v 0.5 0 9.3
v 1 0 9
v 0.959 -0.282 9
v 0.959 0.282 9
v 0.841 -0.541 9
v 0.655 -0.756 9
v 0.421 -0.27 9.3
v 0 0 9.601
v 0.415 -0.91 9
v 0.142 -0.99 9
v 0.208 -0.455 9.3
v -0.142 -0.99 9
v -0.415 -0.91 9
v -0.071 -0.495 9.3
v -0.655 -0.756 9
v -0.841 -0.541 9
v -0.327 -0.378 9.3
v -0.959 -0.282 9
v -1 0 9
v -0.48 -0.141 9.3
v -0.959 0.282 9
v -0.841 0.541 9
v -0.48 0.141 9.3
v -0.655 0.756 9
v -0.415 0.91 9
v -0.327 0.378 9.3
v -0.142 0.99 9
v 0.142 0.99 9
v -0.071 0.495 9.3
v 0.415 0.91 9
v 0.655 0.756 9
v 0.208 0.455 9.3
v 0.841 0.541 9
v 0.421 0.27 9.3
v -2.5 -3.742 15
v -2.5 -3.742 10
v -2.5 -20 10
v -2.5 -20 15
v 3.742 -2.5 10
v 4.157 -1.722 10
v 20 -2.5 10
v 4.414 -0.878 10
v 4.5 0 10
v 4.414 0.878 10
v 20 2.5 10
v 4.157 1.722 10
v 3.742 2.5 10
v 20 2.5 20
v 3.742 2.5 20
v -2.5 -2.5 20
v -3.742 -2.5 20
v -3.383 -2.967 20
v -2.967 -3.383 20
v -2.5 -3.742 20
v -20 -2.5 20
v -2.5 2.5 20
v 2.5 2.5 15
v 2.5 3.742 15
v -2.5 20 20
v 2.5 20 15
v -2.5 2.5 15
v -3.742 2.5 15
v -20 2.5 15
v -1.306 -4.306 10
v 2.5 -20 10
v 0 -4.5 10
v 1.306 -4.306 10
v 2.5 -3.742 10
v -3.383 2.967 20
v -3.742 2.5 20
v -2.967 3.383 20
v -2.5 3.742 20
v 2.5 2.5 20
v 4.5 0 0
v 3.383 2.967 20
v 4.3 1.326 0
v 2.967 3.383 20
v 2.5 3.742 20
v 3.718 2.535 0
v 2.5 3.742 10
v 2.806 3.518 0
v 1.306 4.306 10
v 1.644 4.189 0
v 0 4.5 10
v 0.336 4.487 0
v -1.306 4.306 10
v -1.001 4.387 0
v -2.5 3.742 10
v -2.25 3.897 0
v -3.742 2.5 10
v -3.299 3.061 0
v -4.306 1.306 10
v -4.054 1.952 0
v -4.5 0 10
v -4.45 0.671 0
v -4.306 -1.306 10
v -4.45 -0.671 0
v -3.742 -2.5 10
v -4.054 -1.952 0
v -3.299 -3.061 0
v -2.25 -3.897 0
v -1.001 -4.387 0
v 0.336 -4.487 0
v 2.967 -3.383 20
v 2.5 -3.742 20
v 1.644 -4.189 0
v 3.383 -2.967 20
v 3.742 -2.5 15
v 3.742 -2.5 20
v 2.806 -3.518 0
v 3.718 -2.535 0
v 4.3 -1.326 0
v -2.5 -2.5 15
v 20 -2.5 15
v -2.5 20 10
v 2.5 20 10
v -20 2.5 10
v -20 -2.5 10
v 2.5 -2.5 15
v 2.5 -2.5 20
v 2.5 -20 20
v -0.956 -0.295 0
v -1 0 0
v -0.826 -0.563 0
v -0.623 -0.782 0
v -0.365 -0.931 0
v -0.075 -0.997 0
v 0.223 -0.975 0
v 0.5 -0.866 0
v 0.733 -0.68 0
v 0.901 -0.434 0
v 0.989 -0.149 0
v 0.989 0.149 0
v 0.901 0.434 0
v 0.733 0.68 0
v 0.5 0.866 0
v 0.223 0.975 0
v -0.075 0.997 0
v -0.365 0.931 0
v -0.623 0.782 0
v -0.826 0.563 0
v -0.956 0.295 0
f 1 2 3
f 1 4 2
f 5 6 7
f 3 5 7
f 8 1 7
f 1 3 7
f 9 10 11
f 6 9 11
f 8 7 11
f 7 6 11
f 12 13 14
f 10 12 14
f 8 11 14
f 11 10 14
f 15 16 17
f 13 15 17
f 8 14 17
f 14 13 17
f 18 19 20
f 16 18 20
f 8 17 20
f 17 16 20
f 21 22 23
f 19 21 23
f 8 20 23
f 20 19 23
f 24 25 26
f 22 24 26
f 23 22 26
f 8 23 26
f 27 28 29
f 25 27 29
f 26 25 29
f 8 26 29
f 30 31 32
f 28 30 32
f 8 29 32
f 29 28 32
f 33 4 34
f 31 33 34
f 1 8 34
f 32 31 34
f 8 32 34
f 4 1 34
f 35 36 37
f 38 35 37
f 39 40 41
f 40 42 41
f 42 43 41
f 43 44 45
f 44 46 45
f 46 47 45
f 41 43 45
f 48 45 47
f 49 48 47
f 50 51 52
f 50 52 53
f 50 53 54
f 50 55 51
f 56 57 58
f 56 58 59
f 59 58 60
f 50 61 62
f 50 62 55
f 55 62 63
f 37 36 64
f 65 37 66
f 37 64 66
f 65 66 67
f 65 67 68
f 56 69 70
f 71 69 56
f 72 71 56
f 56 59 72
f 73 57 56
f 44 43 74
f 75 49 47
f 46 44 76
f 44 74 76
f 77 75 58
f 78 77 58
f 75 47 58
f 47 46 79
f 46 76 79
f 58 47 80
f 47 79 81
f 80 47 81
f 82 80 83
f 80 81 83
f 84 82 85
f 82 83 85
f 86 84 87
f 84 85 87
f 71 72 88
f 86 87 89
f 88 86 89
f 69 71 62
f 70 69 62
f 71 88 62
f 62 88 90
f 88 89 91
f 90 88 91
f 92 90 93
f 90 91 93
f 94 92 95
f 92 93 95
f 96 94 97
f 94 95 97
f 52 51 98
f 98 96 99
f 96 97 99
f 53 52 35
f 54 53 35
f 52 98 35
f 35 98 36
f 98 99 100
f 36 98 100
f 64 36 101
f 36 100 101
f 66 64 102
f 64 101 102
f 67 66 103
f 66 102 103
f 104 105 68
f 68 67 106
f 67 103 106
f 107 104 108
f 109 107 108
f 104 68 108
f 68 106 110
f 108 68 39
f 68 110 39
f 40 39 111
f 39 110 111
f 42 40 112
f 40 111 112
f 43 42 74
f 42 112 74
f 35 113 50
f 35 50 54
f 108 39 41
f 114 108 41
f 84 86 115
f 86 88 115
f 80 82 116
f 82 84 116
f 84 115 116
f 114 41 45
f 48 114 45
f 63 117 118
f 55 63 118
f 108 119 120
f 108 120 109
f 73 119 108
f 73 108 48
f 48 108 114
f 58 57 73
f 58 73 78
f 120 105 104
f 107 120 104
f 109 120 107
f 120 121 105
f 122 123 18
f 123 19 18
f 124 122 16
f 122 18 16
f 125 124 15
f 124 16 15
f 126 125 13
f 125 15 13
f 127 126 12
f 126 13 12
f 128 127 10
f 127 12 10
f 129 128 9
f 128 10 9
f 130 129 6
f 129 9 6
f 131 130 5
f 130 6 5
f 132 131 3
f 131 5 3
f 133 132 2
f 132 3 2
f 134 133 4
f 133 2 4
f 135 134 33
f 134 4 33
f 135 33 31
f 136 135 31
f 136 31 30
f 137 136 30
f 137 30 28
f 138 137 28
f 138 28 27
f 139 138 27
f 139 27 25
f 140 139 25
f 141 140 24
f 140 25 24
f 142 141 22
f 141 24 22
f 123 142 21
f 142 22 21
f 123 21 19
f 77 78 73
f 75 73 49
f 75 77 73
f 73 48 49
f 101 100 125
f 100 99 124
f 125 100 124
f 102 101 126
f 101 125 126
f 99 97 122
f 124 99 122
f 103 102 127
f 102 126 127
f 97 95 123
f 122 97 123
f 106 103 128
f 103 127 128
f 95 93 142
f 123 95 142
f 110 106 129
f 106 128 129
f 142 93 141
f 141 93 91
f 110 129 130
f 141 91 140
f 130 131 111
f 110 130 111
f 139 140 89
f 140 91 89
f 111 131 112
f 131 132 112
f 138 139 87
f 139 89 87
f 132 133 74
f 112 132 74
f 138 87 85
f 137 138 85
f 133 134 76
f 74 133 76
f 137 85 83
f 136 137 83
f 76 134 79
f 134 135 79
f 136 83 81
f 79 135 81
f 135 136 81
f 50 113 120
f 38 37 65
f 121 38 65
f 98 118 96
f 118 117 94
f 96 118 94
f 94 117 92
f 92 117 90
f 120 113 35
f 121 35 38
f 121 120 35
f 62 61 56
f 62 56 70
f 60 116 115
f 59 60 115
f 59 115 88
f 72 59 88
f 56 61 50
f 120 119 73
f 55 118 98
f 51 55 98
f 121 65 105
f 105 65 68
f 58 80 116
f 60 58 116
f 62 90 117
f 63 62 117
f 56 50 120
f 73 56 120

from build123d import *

# Parameters (mm, degrees)
F0_R     = 4.5
F1_DEPTH = 10
F2_W     = 5
F2_H     = 5
F3_DEPTH = 10
F4_SIZE  = 4.99999
F5_DEPTH = 10
F7_D     = 2
F7_DEPTH = 9
F7_TIP   = 0.600860619


# Not quite as in the source:
# - a fillet or chamfer is up to 0.001 mm smaller than in the source, because OpenCascade refuses the exact size


with BuildPart() as f1:
    # F0 (on Top) → F1 (new body)
    with BuildSketch(Plane.XY):
        Circle(F0_R)
    extrude(amount=F1_DEPTH)

    # F2 (on face) → F3 (join)
    with BuildSketch(Plane.XY.offset(10)):
        with BuildLine():
            ThreePointArc((2.5, -3.7416573868), (0, -4.5), (-2.5, -3.7416573868))
            Line((-2.5, -3.7416573868), (-2.5, -20))
            Line((-2.5, -20), (2.5, -20))
            Line((2.5, -20), (2.5, -3.7416573868))
        make_face()
        with BuildLine():
            Line((-3.7416573868, 2.5), (-20, 2.5))
            Line((-20, 2.5), (-20, -2.5))
            Line((-20, -2.5), (-3.7416573868, -2.5))
            ThreePointArc((-3.7416573868, -2.5), (-4.5, 0), (-3.7416573868, 2.5))
        make_face()
        with BuildLine():
            Line((-2.5, 20), (-2.5, 3.7416573868))
            ThreePointArc((-2.5, 3.7416573868), (0, 4.5), (2.5, 3.7416573868))
            Line((2.5, 3.7416573868), (2.5, 20))
            Line((2.5, 20), (-2.5, 20))
        make_face()
        with BuildLine():
            Line((20, 2.5), (3.7416573868, 2.5))
            ThreePointArc((3.7416573868, 2.5), (4.3062430401, 1.3062430401), (4.5, 0))
            ThreePointArc((4.5, 0), (4.3062430401, -1.3062430401), (3.7416573868, -2.5))
            Line((3.7416573868, -2.5), (20, -2.5))
            Line((20, -2.5), (20, 2.5))
        make_face()
        with BuildLine():
            Line((3.7416573868, 2.5), (2.5, 2.5))
            Line((2.5, 2.5), (2.5, -2.5))
            Line((2.5, -2.5), (3.7416573868, -2.5))
            ThreePointArc((3.7416573868, -2.5), (4.3062430401, -1.3062430401), (4.5, 0))
            ThreePointArc((4.5, 0), (4.3062430401, 1.3062430401), (3.7416573868, 2.5))
        make_face()
        Rectangle(F2_W, F2_H)
        with BuildLine():
            Line((2.5, -2.5), (-2.5, -2.5))
            Line((-2.5, -2.5), (-2.5, -3.7416573868))
            ThreePointArc((-2.5, -3.7416573868), (0, -4.5), (2.5, -3.7416573868))
            Line((2.5, -3.7416573868), (2.5, -2.5))
        make_face()
        with BuildLine():
            Line((-2.5, 2.5), (-3.7416573868, 2.5))
            ThreePointArc((-3.7416573868, 2.5), (-4.5, 0), (-3.7416573868, -2.5))
            Line((-3.7416573868, -2.5), (-2.5, -2.5))
            Line((-2.5, -2.5), (-2.5, 2.5))
        make_face()
        with BuildLine():
            Line((-2.5, 3.7416573868), (-2.5, 2.5))
            Line((-2.5, 2.5), (2.5, 2.5))
            Line((2.5, 2.5), (2.5, 3.7416573868))
            ThreePointArc((2.5, 3.7416573868), (0, 4.5), (-2.5, 3.7416573868))
        make_face()
    extrude(amount=F3_DEPTH)

    # F4 (size 5 in the source; OpenCascade refuses exactly that, so slightly less here)
    f4_edges = [f1.edges().sort_by_distance(p)[0] for p in [
        (-2.5, -11.25, 20),
        (-11.25, 2.5, 20),
        (2.5, 11.25, 20),
        (11.25, -2.5, 20),
    ]]
    chamfer(f4_edges, length=F4_SIZE)

    # F5 (add): faces of the model
    f5_faces = [f1.faces().sort_by_distance(p)[0] for p in [
        (-2.940797231, 2.940797231, 10),
        (2.940797231, 2.940797231, 10),
        (2.940797231, -2.940797231, 10),
        (-2.940797231, -2.940797231, 10),
    ]]
    extrude(f5_faces, amount=F5_DEPTH)

    # F7
    with Locations(Plane(origin=(0, 0, 0), x_dir=(1, 0, 0), z_dir=(0, 0, -1))):
        with Locations((0, 0)):
            Hole(F7_D / 2, depth=F7_DEPTH)
            with Locations((0, 0, -(F7_DEPTH + F7_TIP / 2))):  # 118° drill point
                Cone(0, F7_D / 2, F7_TIP, mode=Mode.SUBTRACT)


solid = f1.part
